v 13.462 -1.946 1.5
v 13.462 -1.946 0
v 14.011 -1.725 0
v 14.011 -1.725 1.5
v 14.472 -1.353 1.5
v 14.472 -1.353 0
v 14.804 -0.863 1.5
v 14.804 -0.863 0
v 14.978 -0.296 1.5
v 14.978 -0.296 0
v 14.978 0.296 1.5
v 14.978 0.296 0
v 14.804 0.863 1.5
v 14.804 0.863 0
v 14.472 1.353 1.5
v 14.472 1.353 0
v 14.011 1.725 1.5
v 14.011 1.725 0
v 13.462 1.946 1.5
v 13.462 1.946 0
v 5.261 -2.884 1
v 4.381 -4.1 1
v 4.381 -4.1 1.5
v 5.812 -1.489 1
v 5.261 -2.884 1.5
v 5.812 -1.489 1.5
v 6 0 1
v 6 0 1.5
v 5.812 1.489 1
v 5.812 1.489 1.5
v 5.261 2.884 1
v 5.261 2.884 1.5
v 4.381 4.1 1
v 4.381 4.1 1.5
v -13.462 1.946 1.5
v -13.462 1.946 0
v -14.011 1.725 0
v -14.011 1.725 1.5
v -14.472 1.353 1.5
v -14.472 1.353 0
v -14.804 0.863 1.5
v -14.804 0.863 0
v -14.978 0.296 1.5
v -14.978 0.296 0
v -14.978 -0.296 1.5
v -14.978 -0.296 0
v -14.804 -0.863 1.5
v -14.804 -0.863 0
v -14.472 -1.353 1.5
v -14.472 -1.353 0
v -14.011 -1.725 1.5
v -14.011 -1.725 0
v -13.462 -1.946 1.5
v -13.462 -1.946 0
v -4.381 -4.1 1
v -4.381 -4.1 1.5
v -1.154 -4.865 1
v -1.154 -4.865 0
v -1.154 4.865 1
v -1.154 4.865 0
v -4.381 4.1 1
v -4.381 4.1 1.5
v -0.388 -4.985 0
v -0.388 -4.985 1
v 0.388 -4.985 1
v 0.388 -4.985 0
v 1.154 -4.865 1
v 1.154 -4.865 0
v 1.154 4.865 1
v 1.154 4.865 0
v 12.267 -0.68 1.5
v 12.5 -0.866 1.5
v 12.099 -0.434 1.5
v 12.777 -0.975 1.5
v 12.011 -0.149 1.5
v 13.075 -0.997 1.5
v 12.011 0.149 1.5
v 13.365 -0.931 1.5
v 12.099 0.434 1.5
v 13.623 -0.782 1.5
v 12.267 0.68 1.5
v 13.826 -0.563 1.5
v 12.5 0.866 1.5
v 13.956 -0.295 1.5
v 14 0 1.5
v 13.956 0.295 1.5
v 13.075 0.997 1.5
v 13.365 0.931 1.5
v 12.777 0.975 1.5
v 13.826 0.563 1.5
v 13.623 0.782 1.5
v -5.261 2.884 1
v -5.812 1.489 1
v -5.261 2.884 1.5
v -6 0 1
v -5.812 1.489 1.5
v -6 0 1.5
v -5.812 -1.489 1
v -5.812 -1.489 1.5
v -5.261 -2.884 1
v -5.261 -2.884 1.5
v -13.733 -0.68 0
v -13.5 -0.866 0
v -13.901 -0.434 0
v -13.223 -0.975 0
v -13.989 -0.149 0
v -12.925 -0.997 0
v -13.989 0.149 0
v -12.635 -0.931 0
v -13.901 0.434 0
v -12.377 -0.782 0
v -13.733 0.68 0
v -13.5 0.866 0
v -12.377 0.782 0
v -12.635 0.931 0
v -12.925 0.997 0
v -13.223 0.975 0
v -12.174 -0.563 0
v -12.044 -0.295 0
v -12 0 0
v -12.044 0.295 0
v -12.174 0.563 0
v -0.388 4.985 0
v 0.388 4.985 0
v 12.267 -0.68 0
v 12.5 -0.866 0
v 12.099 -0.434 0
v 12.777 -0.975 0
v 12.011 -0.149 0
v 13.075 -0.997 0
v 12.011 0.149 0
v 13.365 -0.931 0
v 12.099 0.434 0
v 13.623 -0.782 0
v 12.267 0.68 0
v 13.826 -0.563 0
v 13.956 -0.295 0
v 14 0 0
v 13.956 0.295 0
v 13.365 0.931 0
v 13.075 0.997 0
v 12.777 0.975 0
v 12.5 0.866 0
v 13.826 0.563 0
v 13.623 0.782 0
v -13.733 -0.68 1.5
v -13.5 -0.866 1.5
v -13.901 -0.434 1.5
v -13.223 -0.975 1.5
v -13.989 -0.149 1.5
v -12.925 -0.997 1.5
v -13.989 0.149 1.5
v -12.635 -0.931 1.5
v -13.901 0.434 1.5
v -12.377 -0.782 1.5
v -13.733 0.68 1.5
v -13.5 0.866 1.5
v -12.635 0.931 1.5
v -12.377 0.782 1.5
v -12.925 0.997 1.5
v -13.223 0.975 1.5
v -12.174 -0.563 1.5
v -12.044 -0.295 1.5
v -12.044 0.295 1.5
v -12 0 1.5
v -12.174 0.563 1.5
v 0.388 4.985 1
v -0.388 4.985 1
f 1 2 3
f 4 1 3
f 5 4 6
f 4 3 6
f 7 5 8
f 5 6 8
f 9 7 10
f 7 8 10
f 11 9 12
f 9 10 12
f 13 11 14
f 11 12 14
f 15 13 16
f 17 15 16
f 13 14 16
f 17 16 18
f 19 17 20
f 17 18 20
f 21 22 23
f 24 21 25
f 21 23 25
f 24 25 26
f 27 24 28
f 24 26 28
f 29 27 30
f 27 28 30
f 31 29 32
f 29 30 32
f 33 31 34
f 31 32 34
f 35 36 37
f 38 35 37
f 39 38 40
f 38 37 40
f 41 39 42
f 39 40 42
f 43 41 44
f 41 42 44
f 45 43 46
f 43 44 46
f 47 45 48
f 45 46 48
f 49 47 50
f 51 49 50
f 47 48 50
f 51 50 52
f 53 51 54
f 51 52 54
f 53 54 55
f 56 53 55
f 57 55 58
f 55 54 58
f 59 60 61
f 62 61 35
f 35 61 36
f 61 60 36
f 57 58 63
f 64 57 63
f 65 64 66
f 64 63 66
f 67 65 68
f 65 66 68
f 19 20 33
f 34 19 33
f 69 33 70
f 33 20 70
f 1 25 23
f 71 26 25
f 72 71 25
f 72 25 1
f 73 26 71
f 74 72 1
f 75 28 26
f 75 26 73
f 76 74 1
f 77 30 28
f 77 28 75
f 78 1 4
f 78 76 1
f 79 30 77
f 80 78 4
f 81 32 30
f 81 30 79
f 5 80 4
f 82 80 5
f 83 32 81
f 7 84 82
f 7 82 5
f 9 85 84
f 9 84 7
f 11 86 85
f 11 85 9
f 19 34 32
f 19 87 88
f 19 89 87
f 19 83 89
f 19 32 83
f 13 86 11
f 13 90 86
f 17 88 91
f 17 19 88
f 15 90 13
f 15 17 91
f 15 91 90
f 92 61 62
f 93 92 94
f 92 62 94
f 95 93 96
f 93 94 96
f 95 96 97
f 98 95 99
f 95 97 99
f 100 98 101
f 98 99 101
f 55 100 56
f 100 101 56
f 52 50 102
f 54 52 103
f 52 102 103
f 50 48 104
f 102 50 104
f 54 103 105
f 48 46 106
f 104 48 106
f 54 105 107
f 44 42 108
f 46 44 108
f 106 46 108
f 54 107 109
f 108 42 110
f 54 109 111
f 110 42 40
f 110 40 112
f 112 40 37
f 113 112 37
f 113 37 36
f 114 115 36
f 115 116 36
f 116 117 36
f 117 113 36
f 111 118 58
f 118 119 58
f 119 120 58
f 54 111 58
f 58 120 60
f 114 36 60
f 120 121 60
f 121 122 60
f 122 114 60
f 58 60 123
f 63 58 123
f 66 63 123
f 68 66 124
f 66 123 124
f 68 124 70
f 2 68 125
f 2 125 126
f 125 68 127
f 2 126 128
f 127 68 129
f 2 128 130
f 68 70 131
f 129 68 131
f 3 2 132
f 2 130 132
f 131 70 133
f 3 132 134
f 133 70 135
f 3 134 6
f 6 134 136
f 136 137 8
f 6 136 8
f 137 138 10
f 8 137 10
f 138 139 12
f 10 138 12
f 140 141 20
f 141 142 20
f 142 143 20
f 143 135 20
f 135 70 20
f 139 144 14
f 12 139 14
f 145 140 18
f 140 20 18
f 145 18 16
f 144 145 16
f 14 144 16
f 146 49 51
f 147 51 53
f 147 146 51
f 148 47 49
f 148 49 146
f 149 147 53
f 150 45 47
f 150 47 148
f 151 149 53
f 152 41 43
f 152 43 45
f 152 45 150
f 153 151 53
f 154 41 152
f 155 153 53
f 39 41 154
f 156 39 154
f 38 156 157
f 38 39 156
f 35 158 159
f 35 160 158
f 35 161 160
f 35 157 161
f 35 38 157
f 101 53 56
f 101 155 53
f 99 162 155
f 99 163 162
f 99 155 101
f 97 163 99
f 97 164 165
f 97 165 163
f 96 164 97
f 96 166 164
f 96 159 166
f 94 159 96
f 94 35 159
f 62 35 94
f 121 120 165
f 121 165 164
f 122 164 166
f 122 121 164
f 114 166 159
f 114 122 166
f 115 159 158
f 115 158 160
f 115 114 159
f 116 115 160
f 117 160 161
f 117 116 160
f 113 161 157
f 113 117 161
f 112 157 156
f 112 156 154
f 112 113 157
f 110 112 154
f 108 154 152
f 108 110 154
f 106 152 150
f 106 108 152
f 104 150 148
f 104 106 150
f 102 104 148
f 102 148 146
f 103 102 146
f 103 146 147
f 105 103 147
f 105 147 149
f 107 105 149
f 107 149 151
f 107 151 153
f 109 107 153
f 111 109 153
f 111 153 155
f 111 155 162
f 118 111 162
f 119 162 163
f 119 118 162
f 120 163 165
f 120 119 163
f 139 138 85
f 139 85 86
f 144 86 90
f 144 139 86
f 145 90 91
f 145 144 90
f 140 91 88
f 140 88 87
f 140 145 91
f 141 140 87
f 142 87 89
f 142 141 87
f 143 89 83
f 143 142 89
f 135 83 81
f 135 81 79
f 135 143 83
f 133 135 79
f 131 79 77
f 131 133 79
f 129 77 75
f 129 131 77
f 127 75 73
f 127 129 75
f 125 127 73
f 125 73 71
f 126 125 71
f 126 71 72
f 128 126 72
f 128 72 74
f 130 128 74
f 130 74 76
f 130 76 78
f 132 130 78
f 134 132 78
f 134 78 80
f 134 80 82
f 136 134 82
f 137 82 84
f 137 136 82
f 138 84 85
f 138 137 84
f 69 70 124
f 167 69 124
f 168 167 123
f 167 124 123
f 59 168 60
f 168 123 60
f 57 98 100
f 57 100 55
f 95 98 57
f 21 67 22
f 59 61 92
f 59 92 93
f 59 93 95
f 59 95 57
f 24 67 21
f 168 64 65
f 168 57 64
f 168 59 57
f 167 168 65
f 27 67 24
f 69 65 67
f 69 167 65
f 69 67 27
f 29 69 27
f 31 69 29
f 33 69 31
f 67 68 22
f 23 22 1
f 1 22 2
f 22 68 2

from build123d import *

# Parameters (mm, degrees)
F0_R     = 1
F1_DEPTH = 1.5
F2_R     = 6
F3_DEPTH = 0.5


with BuildPart() as f1:
    # F0 (on Top) → F1 (new body)
    with BuildSketch(Plane.XY):
        with BuildLine():
            Line((13.461538, 1.946017), (1.153846, 4.865043))
            ThreePointArc((1.153846, 4.865043), (0, 5), (-1.153846, 4.865043))
            Line((-1.153846, 4.865043), (-13.461538, 1.946017))
            ThreePointArc((-13.461538, 1.946017), (-15, 0), (-13.461538, -1.946017))
            Line((-13.461538, -1.946017), (-1.153846, -4.865043))
            ThreePointArc((-1.153846, -4.865043), (0, -5), (1.153846, -4.865043))
            Line((1.153846, -4.865043), (13.461538, -1.946017))
            ThreePointArc((13.461538, -1.946017), (15, 0), (13.461538, 1.946017))
        make_face()
        with Locations((-13, 0)):
            Circle(F0_R, mode=Mode.SUBTRACT)
        with Locations((13, 0)):
            Circle(F0_R, mode=Mode.SUBTRACT)
    extrude(amount=F1_DEPTH)

    # F2 (on face) → F3 (cut)
    with BuildSketch(Plane.XY.offset(1.5)):
        Circle(F2_R)
    extrude(amount=-F3_DEPTH, mode=Mode.SUBTRACT)


solid = f1.part
